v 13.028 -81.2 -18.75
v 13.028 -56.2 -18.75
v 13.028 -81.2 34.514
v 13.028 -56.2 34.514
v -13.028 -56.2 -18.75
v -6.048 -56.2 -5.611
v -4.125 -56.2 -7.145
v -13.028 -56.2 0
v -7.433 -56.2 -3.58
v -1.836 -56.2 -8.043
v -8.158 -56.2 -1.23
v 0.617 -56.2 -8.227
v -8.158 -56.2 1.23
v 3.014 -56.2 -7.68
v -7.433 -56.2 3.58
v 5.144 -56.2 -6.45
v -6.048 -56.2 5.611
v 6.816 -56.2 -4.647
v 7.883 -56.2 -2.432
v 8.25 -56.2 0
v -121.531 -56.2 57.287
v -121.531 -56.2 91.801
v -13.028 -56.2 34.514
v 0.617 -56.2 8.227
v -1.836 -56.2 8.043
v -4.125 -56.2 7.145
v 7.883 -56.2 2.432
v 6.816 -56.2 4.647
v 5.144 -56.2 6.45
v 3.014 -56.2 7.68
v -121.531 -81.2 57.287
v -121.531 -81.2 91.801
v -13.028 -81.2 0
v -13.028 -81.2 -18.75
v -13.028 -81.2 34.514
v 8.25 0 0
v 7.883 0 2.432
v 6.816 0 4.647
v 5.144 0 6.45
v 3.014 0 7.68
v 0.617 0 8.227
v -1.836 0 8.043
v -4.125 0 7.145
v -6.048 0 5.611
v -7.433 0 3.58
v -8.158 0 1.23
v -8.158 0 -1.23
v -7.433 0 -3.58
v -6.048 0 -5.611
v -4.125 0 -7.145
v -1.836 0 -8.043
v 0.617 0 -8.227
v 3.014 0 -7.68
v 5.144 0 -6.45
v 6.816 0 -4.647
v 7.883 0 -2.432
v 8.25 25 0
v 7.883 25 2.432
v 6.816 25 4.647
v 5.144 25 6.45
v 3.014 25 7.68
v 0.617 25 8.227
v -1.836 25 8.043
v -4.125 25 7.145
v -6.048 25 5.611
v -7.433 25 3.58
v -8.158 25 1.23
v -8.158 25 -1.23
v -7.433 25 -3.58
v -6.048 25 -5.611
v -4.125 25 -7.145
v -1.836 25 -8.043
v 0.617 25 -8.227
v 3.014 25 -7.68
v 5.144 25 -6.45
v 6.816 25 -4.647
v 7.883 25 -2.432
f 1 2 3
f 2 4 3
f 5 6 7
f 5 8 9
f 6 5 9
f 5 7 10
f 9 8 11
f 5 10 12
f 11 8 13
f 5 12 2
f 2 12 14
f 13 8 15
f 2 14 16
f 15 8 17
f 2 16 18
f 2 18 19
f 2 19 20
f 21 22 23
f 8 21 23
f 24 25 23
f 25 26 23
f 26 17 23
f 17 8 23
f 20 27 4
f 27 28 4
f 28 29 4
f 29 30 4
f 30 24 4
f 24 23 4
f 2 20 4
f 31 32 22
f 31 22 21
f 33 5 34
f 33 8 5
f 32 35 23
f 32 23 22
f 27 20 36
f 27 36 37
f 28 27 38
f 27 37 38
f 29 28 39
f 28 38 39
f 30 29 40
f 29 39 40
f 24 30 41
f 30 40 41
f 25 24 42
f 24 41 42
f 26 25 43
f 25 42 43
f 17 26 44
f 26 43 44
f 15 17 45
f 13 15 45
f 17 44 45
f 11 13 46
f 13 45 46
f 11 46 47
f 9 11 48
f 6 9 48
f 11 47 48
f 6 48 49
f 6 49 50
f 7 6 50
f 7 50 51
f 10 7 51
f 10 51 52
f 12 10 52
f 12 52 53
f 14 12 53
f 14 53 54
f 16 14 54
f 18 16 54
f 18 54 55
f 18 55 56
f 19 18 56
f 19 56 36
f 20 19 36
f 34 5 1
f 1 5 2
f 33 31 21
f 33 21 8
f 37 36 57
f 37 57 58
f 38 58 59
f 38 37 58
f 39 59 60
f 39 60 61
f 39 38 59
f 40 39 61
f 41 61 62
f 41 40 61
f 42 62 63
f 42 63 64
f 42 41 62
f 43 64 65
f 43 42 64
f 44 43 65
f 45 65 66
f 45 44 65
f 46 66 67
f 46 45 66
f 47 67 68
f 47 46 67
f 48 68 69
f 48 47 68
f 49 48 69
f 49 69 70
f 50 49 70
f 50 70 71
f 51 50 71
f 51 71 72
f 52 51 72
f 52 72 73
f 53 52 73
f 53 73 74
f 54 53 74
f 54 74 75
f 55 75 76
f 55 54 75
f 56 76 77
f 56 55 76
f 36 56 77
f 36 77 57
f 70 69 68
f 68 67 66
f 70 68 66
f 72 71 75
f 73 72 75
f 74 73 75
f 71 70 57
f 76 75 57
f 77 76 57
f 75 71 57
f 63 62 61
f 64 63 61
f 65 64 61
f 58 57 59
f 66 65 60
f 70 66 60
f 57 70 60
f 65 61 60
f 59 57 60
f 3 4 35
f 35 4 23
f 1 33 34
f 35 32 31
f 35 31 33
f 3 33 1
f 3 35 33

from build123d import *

# Parameters (mm, degrees)
F0_R     = 8.25
F1_DEPTH = 56.2
F3_DEPTH = 25
F4_DEPTH = 25
F6_DEPTH = 25
F7_DEPTH = 10.5
F8_DEPTH = 25
F9_DEPTH = 25


with BuildPart() as f1:
    # F0 (on Front) → F1 (new body)
    with BuildSketch(Plane.XZ):
        Circle(F0_R)
    extrude(amount=F1_DEPTH)

    # F2 (on face) → F3 (join)
    with BuildSketch(Plane.XZ.offset(56.2)):
        with BuildLine():
            Line((-13.0284968764, -8.25), (0, -8.25))
            ThreePointArc((0, -8.25), (-8.25, 0), (0, 8.25))
            Line((0, 8.25), (0, 34.5139689744))
            Line((0, 34.5139689744), (-13.0284968764, 34.5139689744))
            Line((-13.0284968764, 34.5139689744), (-13.0284968764, -8.25))
        make_face()
    extrude(amount=F3_DEPTH)

    # F2 (on face) → F4 (join)
    with BuildSketch(Plane.XZ.offset(56.2)):
        with BuildLine():
            ThreePointArc((8.25, 0), (5.8336309448, -5.8336309448), (0, -8.25))
            Line((0, -8.25), (13.0284968764, -8.25))
            Line((13.0284968764, -8.25), (13.0284968764, 34.5139689744))
            Line((13.0284968764, 34.5139689744), (0, 34.5139689744))
            Line((0, 34.5139689744), (0, 8.25))
            ThreePointArc((0, 8.25), (5.8336309448, 5.8336309448), (8.25, 0))
        make_face()
    extrude(amount=F4_DEPTH)

    # F5 (on face) → F6 (join)
    with BuildSketch(Plane.XZ.offset(81.2)):
        Polygon((-13.0284968764, 0), (-13.0284968764, 34.5139689744), (-121.5313971043, 91.8013229966), (-121.5313971043, 57.2873540223), align=None)
    extrude(amount=-F6_DEPTH)

    # F7 (add): faces of the model
    f7_faces = [f1.faces().sort_by_distance(p)[0] for p in [
        (-6.5142484382, -68.7, -8.25),
        (6.5142484382, -68.7, -8.25),
    ]]
    extrude(f7_faces, amount=F7_DEPTH)

    # F8 (add): a face of the model
    f8_faces = [f1.faces().sort_by_distance(p)[0] for p in [
        (0, -56.2, 0),
    ]]
    extrude(f8_faces, amount=F8_DEPTH)

    # F9 (add): a face of the model
    f9_faces = [f1.faces().sort_by_distance(p)[0] for p in [
        (0, 0, 0),
    ]]
    extrude(f9_faces, amount=F9_DEPTH)


solid = f1.part
